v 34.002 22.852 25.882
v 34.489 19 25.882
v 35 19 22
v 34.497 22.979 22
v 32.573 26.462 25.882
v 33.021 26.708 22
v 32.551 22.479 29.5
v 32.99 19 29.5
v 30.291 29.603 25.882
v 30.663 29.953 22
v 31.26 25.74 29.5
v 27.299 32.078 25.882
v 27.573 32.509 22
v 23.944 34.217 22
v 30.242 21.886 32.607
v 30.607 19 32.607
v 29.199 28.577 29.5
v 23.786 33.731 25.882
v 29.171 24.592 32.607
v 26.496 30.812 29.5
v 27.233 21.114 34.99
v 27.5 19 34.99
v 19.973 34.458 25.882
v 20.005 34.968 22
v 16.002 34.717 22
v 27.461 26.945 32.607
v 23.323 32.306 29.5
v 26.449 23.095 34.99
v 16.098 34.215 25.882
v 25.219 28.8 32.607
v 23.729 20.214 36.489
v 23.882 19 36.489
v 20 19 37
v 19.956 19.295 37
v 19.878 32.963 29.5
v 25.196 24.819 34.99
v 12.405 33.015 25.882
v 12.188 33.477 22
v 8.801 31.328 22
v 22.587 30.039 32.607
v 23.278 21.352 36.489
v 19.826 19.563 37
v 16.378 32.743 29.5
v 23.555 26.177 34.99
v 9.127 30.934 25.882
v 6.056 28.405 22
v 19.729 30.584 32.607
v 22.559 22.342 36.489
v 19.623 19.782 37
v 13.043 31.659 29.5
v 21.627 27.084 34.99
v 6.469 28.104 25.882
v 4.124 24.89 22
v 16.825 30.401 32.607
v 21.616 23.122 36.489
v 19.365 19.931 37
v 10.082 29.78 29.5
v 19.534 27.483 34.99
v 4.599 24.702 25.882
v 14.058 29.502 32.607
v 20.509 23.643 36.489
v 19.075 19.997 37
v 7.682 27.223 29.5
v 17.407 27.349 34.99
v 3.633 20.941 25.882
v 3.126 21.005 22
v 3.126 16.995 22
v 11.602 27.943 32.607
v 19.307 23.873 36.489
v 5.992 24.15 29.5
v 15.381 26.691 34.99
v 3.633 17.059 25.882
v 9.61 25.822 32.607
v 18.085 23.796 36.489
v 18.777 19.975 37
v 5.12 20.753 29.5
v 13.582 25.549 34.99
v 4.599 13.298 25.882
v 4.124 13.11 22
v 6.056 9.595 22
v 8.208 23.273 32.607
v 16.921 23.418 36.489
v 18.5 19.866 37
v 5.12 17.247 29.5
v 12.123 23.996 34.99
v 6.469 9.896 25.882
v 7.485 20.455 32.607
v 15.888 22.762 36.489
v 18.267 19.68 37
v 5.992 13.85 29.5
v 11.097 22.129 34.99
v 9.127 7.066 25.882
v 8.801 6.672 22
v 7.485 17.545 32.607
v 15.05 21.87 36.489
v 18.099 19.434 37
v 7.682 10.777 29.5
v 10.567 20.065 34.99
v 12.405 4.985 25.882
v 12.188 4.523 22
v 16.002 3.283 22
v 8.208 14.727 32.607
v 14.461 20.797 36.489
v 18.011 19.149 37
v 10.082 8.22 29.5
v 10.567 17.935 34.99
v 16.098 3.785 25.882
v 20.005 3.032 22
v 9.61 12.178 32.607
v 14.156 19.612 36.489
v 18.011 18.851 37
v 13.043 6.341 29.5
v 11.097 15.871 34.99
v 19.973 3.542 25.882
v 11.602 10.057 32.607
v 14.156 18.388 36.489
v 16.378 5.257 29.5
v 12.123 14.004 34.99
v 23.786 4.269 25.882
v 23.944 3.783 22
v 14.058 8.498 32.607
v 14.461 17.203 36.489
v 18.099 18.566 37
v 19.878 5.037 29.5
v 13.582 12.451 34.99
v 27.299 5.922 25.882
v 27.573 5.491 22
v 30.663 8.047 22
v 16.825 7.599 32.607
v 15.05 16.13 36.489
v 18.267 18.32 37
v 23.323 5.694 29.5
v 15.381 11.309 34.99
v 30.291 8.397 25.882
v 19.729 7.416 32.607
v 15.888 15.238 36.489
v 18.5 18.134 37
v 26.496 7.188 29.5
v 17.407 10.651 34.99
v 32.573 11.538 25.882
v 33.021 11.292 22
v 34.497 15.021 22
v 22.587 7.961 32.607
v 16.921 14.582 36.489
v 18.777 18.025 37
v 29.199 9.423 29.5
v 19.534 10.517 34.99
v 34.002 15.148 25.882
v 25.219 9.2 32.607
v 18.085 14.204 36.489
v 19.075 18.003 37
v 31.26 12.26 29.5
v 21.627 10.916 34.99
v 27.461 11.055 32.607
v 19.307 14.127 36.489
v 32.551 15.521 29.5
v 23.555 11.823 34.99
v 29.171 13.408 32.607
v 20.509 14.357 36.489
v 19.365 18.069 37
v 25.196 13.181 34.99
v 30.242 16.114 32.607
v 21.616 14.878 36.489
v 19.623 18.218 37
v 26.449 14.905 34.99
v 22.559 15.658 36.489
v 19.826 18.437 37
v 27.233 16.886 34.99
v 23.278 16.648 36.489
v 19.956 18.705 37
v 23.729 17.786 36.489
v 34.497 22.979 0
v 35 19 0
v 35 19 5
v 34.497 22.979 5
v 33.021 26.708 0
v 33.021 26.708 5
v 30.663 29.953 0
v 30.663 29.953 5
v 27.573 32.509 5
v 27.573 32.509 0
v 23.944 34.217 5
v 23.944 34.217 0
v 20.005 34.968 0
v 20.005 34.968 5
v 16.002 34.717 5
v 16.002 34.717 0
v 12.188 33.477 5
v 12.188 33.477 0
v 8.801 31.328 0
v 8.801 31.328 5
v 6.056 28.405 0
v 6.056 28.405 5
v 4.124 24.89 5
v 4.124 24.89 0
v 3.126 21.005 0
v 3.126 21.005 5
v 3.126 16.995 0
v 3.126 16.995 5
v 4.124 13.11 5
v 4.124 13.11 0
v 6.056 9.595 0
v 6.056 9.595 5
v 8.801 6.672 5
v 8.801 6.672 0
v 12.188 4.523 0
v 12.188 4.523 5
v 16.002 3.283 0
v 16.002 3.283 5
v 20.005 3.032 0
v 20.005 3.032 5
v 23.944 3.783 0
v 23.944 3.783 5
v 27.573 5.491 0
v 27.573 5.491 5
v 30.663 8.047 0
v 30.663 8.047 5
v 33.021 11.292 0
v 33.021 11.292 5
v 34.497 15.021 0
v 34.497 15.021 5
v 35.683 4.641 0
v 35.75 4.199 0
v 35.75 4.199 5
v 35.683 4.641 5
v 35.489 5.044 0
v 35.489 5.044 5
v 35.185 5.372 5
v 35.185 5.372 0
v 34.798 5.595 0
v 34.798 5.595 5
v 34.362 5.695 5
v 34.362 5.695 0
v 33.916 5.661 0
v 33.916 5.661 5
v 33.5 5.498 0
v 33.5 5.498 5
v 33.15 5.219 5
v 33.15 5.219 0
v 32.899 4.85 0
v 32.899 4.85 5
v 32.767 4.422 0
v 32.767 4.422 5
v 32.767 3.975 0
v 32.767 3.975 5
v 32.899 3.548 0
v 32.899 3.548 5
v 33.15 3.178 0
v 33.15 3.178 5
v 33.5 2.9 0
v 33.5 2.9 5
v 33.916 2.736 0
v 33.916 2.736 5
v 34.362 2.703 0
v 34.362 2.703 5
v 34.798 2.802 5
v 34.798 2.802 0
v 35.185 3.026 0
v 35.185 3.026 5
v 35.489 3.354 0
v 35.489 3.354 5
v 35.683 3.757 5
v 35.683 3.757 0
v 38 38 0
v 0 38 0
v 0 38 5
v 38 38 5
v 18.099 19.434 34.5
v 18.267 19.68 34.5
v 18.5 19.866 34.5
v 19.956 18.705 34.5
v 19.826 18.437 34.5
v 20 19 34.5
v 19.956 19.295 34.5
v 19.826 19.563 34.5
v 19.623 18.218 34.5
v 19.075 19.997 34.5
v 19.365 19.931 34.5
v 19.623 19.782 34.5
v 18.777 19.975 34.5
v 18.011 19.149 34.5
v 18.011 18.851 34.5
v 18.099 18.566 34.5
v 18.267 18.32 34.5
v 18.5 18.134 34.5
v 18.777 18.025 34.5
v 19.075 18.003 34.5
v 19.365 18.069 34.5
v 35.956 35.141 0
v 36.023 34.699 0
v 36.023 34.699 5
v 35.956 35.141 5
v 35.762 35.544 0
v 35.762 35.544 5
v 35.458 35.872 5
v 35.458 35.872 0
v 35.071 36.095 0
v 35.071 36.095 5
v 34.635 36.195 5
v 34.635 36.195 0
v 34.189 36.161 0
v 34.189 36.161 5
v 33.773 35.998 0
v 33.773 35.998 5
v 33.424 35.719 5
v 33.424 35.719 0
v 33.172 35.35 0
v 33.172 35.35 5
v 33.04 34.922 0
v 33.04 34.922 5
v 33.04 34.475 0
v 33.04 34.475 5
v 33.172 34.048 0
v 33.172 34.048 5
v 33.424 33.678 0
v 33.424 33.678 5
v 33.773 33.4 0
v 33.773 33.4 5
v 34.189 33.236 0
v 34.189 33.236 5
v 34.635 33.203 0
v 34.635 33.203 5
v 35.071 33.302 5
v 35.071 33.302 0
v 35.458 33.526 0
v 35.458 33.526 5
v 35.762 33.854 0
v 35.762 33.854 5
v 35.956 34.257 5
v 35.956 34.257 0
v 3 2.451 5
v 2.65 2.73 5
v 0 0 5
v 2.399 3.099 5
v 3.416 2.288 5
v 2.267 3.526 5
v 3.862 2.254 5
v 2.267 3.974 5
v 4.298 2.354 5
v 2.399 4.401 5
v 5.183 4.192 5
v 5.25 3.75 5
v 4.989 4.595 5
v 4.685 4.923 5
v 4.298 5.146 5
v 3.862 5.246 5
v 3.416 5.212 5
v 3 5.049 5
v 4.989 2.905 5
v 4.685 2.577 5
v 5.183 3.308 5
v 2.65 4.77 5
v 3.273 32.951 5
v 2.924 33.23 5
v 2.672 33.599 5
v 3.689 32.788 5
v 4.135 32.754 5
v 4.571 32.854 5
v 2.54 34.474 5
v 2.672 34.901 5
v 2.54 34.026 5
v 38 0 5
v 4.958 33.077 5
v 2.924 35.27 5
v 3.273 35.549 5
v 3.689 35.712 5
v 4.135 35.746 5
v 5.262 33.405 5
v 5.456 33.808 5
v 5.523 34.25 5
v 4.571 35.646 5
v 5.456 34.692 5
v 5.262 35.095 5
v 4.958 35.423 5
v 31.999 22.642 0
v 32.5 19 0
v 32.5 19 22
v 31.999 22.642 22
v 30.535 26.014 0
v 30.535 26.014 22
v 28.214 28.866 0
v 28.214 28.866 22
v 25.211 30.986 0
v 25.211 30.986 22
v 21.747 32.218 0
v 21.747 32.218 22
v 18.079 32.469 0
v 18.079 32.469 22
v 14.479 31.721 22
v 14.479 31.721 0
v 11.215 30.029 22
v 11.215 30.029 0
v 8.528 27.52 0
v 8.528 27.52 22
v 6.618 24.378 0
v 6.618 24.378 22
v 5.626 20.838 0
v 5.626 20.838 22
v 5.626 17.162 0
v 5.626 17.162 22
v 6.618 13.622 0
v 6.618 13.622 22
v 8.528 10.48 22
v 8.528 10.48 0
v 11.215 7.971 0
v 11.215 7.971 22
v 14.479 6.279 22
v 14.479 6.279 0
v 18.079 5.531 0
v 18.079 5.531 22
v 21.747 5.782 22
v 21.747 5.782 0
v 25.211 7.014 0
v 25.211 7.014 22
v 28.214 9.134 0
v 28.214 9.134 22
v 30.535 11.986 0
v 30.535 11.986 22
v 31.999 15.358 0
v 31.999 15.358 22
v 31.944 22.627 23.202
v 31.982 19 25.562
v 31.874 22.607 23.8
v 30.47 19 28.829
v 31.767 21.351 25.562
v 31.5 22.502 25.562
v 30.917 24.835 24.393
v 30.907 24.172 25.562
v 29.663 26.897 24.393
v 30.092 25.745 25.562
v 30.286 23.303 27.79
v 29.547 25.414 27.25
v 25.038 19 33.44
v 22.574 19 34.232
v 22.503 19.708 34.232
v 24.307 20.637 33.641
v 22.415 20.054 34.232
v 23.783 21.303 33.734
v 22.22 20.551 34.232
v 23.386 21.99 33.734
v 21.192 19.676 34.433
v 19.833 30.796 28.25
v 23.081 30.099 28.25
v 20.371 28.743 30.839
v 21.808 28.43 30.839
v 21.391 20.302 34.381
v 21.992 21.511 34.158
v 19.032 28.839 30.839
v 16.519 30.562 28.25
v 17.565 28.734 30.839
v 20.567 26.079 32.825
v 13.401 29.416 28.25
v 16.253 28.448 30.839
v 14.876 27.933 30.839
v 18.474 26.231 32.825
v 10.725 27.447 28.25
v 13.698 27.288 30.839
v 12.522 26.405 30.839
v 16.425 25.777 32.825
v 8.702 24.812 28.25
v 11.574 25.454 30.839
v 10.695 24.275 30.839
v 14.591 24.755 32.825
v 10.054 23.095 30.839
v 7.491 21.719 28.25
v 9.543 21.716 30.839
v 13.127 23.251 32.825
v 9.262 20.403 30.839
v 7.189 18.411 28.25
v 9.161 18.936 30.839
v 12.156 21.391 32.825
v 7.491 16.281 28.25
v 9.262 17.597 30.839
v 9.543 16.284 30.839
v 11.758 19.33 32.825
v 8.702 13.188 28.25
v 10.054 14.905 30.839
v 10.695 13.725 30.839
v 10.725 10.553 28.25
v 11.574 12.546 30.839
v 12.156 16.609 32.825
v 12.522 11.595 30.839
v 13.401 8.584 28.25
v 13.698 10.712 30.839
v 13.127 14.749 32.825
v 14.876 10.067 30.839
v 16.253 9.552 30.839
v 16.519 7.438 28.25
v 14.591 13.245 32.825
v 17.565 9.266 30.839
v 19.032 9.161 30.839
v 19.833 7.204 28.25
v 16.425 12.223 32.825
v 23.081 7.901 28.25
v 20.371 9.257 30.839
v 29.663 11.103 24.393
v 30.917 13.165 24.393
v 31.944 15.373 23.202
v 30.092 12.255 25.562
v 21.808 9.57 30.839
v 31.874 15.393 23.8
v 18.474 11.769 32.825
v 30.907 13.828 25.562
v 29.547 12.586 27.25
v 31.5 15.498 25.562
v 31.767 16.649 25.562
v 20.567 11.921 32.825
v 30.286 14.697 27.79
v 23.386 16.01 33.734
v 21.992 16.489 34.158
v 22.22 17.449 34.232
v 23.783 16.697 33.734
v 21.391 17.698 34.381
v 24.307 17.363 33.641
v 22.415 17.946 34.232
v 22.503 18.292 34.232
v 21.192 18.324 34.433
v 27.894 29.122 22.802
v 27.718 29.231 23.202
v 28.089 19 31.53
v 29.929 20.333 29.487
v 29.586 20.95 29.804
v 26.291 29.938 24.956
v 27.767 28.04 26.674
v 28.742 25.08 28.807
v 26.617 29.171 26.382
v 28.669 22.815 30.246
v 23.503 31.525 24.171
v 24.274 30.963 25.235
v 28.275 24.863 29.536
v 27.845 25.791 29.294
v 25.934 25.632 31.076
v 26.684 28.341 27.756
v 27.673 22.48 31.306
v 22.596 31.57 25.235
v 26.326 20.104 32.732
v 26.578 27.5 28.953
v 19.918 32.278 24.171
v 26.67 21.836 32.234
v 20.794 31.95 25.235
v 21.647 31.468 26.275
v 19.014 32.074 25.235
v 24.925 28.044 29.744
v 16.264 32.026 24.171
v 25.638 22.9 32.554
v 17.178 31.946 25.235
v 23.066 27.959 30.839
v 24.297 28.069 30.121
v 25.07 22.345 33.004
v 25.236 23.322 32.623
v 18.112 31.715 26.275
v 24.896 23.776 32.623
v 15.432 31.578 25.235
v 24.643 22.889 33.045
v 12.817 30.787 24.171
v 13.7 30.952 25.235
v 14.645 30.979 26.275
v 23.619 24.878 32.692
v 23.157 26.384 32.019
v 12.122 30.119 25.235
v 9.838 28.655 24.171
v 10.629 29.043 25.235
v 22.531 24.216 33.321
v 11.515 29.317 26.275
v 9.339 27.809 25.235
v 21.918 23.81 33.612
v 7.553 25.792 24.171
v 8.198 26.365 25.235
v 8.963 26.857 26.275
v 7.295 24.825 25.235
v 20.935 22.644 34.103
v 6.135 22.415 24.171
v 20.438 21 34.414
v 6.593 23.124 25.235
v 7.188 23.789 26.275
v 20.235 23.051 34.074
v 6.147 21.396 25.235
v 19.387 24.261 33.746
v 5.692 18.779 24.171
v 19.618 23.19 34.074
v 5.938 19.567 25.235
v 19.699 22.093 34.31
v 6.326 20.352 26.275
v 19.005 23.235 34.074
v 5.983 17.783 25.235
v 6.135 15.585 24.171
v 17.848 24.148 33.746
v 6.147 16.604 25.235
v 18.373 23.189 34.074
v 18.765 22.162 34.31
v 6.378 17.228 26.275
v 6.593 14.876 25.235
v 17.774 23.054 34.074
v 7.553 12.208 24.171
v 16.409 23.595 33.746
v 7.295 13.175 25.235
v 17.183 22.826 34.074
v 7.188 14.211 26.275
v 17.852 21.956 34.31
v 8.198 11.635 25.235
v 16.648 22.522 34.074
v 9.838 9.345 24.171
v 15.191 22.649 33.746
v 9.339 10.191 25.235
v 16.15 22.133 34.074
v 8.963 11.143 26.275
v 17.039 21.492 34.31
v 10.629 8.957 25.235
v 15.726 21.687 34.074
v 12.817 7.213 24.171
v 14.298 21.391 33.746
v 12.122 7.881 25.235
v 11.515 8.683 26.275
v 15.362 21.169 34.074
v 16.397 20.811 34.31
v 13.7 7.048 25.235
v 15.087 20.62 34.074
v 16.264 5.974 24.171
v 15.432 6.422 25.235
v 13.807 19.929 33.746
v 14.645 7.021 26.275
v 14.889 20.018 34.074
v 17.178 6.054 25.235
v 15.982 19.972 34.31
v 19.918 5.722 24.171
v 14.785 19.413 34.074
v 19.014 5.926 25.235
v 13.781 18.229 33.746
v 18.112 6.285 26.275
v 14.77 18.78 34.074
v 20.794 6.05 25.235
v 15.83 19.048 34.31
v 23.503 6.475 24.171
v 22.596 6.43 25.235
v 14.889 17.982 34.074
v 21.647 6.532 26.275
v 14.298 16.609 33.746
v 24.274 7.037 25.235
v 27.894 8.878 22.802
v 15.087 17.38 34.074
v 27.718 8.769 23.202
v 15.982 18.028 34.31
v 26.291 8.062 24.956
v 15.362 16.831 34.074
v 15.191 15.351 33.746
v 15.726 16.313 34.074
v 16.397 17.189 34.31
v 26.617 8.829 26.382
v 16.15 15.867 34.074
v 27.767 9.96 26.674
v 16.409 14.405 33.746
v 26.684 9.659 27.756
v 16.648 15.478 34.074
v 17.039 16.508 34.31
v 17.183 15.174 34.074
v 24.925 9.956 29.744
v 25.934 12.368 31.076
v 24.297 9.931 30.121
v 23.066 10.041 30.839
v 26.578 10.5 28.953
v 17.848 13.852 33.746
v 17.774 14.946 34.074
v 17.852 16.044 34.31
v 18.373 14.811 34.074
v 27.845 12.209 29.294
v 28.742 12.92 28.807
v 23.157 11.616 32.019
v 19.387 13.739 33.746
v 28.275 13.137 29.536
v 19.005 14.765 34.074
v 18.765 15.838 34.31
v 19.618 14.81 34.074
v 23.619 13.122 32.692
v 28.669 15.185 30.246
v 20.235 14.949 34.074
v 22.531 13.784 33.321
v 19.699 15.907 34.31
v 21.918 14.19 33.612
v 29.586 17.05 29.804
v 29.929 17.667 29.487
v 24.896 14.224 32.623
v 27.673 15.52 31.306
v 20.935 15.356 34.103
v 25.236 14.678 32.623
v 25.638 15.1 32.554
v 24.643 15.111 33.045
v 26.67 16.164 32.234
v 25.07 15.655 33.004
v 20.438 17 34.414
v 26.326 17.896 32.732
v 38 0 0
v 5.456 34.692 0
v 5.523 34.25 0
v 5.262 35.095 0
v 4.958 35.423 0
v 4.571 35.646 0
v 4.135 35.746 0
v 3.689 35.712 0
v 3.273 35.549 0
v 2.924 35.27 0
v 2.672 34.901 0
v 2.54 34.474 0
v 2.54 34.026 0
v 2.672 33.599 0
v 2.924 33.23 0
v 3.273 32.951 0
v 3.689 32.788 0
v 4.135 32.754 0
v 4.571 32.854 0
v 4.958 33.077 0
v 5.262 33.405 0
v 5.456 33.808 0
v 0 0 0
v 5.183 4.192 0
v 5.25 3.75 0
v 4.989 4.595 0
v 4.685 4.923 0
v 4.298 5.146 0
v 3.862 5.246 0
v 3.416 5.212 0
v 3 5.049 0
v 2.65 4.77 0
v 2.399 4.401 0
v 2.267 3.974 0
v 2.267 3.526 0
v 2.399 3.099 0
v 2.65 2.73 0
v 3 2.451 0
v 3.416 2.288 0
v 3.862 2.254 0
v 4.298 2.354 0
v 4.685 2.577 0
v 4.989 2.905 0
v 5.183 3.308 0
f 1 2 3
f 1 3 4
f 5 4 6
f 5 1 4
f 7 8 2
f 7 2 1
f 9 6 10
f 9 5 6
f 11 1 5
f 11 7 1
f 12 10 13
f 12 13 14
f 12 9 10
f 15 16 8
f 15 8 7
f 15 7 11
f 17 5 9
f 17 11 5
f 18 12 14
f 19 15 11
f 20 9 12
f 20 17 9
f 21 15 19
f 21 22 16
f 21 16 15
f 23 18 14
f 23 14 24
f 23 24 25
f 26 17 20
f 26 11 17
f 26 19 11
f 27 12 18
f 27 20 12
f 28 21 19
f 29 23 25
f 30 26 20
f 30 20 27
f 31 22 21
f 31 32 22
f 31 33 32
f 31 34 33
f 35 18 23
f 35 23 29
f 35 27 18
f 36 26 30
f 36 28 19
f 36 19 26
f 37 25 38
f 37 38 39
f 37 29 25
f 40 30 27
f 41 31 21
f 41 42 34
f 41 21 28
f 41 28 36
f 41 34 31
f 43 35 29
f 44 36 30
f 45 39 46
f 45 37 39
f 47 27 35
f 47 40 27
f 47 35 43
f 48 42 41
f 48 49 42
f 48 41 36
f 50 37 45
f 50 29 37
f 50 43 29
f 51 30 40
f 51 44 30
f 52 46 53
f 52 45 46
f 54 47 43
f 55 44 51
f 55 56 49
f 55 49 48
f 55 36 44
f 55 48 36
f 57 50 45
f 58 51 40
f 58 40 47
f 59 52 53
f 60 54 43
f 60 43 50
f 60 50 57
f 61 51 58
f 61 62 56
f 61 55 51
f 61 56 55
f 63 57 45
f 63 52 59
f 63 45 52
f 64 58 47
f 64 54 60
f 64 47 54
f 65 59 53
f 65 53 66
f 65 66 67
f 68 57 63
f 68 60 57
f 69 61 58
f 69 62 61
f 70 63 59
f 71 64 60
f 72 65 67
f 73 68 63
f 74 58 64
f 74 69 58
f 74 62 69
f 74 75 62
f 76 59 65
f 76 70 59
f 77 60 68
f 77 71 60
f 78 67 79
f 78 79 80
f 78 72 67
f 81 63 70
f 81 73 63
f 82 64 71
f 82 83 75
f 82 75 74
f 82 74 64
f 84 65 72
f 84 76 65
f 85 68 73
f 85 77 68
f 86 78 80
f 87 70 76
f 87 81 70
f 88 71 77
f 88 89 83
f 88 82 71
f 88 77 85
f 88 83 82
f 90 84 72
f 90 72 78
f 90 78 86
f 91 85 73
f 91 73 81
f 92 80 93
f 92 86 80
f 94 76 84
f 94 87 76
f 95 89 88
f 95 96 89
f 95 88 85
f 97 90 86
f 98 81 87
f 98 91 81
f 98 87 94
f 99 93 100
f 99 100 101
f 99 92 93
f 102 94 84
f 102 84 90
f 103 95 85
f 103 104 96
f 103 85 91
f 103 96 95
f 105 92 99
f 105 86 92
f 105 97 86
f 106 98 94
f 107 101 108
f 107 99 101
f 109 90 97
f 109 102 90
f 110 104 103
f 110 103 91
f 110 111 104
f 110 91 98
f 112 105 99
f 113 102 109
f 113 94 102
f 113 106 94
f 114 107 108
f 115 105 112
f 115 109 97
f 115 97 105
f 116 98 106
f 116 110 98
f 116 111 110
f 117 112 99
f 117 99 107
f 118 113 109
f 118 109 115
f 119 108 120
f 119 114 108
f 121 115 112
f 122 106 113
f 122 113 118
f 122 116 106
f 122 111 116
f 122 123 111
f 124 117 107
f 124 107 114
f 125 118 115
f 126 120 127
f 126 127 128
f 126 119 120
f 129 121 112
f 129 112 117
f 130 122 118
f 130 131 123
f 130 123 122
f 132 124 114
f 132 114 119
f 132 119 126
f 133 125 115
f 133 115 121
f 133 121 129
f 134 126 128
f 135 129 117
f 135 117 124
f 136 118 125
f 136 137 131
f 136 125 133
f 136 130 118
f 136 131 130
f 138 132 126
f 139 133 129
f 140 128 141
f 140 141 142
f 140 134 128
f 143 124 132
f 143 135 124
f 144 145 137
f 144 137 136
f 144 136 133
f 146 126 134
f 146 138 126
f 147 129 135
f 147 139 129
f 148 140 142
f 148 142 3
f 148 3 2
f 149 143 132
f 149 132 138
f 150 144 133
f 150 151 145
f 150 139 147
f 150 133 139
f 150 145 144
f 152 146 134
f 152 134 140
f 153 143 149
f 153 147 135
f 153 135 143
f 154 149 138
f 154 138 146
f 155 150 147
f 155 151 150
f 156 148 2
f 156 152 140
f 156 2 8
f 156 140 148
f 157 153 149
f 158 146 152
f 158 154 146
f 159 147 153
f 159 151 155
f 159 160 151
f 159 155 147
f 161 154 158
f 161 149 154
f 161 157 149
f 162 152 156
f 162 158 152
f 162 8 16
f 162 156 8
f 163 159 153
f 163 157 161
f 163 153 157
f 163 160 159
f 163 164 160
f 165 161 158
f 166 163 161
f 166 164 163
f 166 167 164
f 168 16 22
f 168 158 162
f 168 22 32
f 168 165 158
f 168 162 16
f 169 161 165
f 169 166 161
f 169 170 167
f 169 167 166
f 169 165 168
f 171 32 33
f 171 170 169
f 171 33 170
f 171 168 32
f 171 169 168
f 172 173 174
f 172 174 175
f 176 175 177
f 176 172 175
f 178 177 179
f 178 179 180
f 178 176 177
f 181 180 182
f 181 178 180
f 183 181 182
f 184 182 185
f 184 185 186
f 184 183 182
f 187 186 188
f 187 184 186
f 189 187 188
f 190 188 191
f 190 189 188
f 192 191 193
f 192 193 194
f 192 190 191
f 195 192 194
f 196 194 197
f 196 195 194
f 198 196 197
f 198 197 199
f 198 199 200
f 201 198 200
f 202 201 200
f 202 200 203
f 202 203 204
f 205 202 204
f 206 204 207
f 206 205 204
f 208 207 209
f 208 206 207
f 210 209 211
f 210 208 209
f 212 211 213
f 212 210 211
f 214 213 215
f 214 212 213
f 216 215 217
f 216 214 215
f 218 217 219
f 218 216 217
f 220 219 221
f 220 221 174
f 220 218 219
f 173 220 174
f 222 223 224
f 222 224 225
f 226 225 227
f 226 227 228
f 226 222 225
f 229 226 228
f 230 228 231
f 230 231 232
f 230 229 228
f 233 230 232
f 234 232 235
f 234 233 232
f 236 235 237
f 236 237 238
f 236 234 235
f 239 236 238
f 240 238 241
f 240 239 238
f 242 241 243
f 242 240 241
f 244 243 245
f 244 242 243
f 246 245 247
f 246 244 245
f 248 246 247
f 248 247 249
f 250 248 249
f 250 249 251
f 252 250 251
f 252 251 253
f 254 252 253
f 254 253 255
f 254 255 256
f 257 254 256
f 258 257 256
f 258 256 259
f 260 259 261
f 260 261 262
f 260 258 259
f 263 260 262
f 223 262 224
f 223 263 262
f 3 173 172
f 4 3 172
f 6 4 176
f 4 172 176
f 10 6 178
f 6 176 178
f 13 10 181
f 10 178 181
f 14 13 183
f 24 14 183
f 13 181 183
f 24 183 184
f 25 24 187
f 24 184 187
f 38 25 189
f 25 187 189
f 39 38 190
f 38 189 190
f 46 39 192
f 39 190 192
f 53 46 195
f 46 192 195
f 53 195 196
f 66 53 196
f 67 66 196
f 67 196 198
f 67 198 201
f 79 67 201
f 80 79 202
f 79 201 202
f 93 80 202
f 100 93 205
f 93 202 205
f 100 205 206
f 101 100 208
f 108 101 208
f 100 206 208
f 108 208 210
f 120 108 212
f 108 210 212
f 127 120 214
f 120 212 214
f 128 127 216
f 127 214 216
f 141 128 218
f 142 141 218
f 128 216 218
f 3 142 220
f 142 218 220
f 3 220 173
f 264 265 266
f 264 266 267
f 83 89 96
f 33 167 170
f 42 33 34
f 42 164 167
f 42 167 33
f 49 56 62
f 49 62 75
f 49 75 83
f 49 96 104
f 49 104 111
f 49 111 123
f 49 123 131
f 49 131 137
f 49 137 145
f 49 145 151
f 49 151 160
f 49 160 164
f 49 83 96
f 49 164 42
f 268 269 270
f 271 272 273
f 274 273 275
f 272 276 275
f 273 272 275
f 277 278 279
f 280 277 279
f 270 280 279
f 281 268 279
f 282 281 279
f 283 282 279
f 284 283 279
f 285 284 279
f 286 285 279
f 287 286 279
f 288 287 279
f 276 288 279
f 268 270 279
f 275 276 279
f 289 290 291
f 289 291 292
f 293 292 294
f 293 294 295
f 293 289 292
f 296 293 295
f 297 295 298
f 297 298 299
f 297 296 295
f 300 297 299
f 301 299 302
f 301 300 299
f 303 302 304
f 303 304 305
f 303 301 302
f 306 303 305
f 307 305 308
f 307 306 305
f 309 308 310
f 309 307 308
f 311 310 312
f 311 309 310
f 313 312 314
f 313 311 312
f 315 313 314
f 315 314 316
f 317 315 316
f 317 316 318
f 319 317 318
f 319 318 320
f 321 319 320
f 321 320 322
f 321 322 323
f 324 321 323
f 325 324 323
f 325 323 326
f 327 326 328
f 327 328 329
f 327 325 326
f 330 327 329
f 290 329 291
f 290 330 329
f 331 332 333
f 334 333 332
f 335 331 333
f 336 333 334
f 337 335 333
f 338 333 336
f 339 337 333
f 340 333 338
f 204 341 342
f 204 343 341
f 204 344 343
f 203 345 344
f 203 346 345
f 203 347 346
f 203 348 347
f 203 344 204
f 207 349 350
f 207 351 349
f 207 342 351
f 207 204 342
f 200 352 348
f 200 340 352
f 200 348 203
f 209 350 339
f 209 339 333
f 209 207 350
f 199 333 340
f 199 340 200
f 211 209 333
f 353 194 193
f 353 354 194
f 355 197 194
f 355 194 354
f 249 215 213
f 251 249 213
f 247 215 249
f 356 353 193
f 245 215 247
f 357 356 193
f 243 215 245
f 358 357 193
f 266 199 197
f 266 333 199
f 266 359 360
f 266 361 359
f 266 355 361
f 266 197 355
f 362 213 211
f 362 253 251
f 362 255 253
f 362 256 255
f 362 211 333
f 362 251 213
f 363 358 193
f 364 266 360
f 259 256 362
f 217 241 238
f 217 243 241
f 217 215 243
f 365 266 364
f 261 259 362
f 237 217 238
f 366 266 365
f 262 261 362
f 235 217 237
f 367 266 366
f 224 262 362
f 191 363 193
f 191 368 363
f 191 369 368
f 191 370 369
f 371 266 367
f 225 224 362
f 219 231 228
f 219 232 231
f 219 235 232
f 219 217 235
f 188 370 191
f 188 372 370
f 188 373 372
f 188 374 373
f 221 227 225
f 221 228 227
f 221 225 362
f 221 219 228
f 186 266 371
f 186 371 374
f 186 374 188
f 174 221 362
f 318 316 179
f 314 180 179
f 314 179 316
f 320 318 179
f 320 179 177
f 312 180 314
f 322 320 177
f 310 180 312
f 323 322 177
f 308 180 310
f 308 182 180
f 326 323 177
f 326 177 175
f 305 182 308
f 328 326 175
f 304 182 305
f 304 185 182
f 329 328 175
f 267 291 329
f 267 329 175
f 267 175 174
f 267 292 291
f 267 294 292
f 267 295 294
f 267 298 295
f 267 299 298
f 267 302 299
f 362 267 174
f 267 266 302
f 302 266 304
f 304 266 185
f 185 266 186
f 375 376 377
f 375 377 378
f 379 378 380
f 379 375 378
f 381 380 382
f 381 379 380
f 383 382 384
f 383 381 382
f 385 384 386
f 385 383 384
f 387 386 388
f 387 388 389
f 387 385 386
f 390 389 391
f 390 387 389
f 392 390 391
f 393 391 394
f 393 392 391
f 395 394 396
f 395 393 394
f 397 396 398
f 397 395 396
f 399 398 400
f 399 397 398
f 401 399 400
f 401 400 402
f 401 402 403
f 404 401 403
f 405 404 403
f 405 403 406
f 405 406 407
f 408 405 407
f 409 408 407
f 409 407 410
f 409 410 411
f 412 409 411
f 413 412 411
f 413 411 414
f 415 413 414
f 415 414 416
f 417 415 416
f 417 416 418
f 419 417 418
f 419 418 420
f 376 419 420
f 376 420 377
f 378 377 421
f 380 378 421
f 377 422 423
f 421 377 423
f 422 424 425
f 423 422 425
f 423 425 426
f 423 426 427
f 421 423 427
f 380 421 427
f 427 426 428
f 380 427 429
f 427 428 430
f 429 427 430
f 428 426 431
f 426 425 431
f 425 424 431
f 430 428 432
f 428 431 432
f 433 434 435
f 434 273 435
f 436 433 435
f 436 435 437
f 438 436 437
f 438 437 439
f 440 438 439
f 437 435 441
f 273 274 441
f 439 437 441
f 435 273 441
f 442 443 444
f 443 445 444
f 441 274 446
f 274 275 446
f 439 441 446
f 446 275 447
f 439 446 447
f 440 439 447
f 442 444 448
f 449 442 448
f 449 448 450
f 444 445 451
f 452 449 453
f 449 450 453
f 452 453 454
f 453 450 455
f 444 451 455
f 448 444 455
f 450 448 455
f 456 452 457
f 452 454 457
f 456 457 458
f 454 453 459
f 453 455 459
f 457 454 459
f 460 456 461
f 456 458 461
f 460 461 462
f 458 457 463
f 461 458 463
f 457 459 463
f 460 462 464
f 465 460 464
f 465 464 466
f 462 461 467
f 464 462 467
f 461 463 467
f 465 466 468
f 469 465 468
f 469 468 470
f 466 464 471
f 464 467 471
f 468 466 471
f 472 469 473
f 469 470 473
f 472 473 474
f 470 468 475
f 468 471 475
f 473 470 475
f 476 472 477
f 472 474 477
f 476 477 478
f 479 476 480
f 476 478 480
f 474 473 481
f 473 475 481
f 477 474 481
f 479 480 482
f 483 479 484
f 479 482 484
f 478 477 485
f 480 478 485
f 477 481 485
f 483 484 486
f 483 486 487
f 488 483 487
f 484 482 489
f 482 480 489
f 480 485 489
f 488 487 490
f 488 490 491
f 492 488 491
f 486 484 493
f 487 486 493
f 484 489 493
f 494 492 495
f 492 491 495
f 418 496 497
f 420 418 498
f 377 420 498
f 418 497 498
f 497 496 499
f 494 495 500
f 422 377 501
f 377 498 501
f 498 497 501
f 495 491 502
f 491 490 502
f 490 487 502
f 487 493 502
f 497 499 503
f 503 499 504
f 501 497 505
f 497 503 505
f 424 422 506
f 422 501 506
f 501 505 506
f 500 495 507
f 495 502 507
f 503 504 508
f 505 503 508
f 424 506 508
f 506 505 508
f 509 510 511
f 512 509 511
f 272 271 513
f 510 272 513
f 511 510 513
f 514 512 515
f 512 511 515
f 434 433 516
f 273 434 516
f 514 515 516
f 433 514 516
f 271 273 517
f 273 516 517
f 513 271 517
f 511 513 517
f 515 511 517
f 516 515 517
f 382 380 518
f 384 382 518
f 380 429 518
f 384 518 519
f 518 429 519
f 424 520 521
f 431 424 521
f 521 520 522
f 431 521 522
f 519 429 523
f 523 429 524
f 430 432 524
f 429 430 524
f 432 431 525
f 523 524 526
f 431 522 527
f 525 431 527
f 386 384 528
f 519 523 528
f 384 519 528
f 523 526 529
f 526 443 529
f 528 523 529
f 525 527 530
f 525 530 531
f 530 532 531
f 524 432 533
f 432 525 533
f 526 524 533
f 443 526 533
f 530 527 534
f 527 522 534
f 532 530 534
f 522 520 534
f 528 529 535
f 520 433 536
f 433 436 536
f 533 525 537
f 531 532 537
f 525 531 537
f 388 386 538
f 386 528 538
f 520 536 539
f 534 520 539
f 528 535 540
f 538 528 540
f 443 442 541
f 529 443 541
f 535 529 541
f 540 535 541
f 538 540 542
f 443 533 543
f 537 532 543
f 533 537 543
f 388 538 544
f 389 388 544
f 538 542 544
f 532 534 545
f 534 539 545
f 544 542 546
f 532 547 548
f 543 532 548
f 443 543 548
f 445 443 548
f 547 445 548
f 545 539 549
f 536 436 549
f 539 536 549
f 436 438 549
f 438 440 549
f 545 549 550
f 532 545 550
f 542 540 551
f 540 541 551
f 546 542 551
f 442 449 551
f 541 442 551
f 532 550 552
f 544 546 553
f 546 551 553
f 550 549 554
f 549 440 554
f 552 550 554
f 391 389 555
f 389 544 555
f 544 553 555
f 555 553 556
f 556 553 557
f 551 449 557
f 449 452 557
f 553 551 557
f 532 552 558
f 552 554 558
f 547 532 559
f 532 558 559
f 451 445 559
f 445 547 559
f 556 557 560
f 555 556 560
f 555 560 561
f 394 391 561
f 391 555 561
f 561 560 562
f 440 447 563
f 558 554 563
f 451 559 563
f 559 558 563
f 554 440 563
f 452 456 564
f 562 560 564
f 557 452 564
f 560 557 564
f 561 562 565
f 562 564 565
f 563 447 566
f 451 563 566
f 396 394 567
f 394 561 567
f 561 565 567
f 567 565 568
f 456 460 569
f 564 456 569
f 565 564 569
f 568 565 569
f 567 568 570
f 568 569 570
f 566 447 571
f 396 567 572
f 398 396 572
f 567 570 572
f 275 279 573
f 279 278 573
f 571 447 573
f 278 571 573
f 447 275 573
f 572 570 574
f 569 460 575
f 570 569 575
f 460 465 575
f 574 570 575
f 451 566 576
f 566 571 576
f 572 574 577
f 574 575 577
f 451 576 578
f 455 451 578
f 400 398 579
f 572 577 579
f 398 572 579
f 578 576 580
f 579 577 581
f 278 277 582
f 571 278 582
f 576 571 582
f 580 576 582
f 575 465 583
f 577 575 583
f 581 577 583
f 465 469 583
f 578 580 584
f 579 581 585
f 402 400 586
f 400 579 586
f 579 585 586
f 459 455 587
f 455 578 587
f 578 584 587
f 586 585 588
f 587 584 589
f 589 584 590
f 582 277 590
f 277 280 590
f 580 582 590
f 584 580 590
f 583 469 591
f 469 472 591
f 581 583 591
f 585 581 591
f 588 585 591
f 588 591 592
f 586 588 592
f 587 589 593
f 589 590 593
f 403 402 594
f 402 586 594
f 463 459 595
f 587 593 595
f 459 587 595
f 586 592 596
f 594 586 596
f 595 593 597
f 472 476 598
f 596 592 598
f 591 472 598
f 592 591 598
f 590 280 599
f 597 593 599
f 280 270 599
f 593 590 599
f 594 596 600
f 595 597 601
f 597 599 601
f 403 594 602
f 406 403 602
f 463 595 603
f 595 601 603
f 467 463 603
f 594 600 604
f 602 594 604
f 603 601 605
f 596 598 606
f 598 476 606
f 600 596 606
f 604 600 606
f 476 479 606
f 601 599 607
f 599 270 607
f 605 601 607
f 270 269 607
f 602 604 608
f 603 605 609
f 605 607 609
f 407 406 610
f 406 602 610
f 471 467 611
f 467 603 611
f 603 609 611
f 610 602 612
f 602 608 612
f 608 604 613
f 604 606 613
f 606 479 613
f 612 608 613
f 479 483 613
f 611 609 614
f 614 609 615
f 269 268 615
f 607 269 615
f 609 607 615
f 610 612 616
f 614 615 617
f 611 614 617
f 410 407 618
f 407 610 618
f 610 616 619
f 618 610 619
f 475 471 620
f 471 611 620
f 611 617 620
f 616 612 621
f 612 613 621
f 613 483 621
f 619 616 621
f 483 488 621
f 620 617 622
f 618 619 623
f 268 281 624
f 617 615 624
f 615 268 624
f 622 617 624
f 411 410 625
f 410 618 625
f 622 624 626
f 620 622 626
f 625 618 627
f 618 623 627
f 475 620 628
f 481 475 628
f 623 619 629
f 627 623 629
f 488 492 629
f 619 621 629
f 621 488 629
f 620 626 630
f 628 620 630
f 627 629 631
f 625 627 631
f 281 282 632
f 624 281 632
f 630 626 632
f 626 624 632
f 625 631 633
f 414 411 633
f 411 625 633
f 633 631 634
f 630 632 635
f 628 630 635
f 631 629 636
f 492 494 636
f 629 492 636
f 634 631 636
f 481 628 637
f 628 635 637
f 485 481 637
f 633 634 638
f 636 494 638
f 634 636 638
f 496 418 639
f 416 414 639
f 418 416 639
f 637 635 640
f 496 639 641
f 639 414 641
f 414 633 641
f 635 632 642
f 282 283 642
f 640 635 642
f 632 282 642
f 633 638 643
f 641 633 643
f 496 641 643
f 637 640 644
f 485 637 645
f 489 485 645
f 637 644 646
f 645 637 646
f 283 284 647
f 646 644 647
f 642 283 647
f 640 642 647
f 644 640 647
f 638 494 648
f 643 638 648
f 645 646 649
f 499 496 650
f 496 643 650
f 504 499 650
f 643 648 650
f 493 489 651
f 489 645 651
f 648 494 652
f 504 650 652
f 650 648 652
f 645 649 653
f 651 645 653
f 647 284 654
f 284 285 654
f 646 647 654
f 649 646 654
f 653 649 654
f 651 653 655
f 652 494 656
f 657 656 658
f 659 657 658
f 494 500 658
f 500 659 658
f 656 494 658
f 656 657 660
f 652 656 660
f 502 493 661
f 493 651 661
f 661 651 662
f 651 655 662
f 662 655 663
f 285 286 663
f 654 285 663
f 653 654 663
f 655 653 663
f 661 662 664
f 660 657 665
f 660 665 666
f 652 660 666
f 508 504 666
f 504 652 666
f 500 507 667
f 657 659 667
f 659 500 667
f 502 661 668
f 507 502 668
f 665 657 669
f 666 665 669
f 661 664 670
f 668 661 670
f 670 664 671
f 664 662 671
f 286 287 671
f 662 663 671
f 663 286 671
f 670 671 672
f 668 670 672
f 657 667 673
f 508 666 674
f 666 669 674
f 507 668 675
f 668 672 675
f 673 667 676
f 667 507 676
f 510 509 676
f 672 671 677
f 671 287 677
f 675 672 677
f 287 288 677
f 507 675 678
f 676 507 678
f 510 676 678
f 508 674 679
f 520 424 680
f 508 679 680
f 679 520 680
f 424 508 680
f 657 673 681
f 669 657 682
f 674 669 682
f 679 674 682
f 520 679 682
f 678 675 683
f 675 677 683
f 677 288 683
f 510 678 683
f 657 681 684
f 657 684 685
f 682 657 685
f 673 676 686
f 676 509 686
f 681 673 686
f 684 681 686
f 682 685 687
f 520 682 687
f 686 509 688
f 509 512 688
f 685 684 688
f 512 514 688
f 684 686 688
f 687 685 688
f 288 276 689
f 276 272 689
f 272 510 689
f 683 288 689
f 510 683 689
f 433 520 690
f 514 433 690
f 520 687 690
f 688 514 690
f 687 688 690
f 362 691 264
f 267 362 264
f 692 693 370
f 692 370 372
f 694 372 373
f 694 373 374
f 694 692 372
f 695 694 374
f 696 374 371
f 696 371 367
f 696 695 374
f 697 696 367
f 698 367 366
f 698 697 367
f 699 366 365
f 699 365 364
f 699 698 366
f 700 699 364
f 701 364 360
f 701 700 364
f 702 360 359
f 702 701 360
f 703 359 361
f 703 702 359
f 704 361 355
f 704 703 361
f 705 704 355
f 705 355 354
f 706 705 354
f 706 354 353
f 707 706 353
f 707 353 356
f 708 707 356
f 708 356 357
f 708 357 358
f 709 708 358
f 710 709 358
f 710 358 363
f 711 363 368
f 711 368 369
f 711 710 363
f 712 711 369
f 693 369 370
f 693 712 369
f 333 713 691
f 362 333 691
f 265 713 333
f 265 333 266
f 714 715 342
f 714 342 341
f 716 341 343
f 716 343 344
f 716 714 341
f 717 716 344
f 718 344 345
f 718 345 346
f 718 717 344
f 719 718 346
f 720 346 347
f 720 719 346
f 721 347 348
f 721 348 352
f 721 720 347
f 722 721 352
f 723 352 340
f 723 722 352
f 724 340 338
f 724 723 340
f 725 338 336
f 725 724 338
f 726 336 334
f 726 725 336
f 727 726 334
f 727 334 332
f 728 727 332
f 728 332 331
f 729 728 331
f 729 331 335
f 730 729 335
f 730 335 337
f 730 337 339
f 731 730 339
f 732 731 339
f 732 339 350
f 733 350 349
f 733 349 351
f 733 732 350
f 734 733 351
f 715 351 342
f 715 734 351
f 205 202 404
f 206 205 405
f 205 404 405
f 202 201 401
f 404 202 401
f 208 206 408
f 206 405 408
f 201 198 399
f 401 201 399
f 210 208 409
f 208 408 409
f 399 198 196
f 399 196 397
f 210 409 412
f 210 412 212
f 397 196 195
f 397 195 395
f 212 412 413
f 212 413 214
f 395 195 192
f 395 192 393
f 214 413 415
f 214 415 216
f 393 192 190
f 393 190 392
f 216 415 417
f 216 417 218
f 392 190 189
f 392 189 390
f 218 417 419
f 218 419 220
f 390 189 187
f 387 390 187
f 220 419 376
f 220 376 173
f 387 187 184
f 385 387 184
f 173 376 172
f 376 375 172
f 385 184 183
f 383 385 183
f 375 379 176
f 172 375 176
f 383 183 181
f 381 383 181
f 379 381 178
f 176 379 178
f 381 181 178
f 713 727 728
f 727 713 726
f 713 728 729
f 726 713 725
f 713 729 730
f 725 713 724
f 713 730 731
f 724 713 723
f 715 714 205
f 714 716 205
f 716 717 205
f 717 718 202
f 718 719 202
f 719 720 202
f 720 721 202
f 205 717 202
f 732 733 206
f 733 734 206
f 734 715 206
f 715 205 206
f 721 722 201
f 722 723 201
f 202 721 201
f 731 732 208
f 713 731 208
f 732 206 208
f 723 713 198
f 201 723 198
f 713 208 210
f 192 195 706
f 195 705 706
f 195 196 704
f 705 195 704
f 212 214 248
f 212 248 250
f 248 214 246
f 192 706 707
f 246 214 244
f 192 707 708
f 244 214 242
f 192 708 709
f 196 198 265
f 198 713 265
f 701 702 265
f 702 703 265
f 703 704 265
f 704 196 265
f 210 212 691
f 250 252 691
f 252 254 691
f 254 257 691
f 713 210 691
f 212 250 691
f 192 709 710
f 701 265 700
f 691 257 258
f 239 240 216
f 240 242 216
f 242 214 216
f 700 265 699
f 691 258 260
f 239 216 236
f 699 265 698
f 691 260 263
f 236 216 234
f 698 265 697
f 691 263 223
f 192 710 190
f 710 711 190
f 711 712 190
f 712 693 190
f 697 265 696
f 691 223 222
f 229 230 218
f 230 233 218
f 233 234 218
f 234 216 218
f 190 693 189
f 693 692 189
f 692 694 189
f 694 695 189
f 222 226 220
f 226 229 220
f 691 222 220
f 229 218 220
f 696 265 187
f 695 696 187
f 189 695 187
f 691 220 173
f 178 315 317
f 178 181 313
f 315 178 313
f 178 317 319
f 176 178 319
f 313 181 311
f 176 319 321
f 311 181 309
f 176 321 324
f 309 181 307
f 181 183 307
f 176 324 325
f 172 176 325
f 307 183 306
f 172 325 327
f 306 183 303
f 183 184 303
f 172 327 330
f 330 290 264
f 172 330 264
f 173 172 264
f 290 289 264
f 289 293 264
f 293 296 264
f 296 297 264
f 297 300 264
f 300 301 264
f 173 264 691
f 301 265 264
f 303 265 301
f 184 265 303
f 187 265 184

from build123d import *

# Parameters (mm, degrees)
F0_R     = 16
F1_DEPTH = 37
F0_W     = 38
F0_H     = 38
F0_R_2   = 1.5
F2_DEPTH = 5
F3_R     = 15
F4_T     = -2.5


with BuildPart() as f1:
    # F0 (on Top) → F1 (new body)
    with BuildSketch(Plane.XY):
        with Locations((19, 19)):
            Circle(F0_R)
    extrude(amount=F1_DEPTH)

    # F3
    f3_edges = [f1.edges().sort_by_distance(p)[0] for p in [
        (3, 19, 37),
    ]]
    fillet(f3_edges, radius=F3_R)

    # F4
    f4_openings = [f1.faces().sort_by_distance(p)[0] for p in [
        (19, 19, 0),
    ]]
    offset(amount=F4_T, openings=f4_openings)


with BuildPart() as f2:
    # F0 (on Top) → F2 (new body)
    with BuildSketch(Plane.XY):
        with Locations((19, 19)):
            Rectangle(F0_W, F0_H)
        with Locations((3.75, 3.75)):
            Circle(F0_R_2, mode=Mode.SUBTRACT)
        with Locations((34.25, 4.1987560689)):
            Circle(F0_R_2, mode=Mode.SUBTRACT)
        with Locations((4.0231071115, 34.25)):
            Circle(F0_R_2, mode=Mode.SUBTRACT)
        with Locations((19, 19)):
            Circle(F0_R, mode=Mode.SUBTRACT)
        with Locations((34.5231071115, 34.6987560689)):
            Circle(F0_R_2, mode=Mode.SUBTRACT)
    extrude(amount=F2_DEPTH)


solid = Compound([f1.part, f2.part])
